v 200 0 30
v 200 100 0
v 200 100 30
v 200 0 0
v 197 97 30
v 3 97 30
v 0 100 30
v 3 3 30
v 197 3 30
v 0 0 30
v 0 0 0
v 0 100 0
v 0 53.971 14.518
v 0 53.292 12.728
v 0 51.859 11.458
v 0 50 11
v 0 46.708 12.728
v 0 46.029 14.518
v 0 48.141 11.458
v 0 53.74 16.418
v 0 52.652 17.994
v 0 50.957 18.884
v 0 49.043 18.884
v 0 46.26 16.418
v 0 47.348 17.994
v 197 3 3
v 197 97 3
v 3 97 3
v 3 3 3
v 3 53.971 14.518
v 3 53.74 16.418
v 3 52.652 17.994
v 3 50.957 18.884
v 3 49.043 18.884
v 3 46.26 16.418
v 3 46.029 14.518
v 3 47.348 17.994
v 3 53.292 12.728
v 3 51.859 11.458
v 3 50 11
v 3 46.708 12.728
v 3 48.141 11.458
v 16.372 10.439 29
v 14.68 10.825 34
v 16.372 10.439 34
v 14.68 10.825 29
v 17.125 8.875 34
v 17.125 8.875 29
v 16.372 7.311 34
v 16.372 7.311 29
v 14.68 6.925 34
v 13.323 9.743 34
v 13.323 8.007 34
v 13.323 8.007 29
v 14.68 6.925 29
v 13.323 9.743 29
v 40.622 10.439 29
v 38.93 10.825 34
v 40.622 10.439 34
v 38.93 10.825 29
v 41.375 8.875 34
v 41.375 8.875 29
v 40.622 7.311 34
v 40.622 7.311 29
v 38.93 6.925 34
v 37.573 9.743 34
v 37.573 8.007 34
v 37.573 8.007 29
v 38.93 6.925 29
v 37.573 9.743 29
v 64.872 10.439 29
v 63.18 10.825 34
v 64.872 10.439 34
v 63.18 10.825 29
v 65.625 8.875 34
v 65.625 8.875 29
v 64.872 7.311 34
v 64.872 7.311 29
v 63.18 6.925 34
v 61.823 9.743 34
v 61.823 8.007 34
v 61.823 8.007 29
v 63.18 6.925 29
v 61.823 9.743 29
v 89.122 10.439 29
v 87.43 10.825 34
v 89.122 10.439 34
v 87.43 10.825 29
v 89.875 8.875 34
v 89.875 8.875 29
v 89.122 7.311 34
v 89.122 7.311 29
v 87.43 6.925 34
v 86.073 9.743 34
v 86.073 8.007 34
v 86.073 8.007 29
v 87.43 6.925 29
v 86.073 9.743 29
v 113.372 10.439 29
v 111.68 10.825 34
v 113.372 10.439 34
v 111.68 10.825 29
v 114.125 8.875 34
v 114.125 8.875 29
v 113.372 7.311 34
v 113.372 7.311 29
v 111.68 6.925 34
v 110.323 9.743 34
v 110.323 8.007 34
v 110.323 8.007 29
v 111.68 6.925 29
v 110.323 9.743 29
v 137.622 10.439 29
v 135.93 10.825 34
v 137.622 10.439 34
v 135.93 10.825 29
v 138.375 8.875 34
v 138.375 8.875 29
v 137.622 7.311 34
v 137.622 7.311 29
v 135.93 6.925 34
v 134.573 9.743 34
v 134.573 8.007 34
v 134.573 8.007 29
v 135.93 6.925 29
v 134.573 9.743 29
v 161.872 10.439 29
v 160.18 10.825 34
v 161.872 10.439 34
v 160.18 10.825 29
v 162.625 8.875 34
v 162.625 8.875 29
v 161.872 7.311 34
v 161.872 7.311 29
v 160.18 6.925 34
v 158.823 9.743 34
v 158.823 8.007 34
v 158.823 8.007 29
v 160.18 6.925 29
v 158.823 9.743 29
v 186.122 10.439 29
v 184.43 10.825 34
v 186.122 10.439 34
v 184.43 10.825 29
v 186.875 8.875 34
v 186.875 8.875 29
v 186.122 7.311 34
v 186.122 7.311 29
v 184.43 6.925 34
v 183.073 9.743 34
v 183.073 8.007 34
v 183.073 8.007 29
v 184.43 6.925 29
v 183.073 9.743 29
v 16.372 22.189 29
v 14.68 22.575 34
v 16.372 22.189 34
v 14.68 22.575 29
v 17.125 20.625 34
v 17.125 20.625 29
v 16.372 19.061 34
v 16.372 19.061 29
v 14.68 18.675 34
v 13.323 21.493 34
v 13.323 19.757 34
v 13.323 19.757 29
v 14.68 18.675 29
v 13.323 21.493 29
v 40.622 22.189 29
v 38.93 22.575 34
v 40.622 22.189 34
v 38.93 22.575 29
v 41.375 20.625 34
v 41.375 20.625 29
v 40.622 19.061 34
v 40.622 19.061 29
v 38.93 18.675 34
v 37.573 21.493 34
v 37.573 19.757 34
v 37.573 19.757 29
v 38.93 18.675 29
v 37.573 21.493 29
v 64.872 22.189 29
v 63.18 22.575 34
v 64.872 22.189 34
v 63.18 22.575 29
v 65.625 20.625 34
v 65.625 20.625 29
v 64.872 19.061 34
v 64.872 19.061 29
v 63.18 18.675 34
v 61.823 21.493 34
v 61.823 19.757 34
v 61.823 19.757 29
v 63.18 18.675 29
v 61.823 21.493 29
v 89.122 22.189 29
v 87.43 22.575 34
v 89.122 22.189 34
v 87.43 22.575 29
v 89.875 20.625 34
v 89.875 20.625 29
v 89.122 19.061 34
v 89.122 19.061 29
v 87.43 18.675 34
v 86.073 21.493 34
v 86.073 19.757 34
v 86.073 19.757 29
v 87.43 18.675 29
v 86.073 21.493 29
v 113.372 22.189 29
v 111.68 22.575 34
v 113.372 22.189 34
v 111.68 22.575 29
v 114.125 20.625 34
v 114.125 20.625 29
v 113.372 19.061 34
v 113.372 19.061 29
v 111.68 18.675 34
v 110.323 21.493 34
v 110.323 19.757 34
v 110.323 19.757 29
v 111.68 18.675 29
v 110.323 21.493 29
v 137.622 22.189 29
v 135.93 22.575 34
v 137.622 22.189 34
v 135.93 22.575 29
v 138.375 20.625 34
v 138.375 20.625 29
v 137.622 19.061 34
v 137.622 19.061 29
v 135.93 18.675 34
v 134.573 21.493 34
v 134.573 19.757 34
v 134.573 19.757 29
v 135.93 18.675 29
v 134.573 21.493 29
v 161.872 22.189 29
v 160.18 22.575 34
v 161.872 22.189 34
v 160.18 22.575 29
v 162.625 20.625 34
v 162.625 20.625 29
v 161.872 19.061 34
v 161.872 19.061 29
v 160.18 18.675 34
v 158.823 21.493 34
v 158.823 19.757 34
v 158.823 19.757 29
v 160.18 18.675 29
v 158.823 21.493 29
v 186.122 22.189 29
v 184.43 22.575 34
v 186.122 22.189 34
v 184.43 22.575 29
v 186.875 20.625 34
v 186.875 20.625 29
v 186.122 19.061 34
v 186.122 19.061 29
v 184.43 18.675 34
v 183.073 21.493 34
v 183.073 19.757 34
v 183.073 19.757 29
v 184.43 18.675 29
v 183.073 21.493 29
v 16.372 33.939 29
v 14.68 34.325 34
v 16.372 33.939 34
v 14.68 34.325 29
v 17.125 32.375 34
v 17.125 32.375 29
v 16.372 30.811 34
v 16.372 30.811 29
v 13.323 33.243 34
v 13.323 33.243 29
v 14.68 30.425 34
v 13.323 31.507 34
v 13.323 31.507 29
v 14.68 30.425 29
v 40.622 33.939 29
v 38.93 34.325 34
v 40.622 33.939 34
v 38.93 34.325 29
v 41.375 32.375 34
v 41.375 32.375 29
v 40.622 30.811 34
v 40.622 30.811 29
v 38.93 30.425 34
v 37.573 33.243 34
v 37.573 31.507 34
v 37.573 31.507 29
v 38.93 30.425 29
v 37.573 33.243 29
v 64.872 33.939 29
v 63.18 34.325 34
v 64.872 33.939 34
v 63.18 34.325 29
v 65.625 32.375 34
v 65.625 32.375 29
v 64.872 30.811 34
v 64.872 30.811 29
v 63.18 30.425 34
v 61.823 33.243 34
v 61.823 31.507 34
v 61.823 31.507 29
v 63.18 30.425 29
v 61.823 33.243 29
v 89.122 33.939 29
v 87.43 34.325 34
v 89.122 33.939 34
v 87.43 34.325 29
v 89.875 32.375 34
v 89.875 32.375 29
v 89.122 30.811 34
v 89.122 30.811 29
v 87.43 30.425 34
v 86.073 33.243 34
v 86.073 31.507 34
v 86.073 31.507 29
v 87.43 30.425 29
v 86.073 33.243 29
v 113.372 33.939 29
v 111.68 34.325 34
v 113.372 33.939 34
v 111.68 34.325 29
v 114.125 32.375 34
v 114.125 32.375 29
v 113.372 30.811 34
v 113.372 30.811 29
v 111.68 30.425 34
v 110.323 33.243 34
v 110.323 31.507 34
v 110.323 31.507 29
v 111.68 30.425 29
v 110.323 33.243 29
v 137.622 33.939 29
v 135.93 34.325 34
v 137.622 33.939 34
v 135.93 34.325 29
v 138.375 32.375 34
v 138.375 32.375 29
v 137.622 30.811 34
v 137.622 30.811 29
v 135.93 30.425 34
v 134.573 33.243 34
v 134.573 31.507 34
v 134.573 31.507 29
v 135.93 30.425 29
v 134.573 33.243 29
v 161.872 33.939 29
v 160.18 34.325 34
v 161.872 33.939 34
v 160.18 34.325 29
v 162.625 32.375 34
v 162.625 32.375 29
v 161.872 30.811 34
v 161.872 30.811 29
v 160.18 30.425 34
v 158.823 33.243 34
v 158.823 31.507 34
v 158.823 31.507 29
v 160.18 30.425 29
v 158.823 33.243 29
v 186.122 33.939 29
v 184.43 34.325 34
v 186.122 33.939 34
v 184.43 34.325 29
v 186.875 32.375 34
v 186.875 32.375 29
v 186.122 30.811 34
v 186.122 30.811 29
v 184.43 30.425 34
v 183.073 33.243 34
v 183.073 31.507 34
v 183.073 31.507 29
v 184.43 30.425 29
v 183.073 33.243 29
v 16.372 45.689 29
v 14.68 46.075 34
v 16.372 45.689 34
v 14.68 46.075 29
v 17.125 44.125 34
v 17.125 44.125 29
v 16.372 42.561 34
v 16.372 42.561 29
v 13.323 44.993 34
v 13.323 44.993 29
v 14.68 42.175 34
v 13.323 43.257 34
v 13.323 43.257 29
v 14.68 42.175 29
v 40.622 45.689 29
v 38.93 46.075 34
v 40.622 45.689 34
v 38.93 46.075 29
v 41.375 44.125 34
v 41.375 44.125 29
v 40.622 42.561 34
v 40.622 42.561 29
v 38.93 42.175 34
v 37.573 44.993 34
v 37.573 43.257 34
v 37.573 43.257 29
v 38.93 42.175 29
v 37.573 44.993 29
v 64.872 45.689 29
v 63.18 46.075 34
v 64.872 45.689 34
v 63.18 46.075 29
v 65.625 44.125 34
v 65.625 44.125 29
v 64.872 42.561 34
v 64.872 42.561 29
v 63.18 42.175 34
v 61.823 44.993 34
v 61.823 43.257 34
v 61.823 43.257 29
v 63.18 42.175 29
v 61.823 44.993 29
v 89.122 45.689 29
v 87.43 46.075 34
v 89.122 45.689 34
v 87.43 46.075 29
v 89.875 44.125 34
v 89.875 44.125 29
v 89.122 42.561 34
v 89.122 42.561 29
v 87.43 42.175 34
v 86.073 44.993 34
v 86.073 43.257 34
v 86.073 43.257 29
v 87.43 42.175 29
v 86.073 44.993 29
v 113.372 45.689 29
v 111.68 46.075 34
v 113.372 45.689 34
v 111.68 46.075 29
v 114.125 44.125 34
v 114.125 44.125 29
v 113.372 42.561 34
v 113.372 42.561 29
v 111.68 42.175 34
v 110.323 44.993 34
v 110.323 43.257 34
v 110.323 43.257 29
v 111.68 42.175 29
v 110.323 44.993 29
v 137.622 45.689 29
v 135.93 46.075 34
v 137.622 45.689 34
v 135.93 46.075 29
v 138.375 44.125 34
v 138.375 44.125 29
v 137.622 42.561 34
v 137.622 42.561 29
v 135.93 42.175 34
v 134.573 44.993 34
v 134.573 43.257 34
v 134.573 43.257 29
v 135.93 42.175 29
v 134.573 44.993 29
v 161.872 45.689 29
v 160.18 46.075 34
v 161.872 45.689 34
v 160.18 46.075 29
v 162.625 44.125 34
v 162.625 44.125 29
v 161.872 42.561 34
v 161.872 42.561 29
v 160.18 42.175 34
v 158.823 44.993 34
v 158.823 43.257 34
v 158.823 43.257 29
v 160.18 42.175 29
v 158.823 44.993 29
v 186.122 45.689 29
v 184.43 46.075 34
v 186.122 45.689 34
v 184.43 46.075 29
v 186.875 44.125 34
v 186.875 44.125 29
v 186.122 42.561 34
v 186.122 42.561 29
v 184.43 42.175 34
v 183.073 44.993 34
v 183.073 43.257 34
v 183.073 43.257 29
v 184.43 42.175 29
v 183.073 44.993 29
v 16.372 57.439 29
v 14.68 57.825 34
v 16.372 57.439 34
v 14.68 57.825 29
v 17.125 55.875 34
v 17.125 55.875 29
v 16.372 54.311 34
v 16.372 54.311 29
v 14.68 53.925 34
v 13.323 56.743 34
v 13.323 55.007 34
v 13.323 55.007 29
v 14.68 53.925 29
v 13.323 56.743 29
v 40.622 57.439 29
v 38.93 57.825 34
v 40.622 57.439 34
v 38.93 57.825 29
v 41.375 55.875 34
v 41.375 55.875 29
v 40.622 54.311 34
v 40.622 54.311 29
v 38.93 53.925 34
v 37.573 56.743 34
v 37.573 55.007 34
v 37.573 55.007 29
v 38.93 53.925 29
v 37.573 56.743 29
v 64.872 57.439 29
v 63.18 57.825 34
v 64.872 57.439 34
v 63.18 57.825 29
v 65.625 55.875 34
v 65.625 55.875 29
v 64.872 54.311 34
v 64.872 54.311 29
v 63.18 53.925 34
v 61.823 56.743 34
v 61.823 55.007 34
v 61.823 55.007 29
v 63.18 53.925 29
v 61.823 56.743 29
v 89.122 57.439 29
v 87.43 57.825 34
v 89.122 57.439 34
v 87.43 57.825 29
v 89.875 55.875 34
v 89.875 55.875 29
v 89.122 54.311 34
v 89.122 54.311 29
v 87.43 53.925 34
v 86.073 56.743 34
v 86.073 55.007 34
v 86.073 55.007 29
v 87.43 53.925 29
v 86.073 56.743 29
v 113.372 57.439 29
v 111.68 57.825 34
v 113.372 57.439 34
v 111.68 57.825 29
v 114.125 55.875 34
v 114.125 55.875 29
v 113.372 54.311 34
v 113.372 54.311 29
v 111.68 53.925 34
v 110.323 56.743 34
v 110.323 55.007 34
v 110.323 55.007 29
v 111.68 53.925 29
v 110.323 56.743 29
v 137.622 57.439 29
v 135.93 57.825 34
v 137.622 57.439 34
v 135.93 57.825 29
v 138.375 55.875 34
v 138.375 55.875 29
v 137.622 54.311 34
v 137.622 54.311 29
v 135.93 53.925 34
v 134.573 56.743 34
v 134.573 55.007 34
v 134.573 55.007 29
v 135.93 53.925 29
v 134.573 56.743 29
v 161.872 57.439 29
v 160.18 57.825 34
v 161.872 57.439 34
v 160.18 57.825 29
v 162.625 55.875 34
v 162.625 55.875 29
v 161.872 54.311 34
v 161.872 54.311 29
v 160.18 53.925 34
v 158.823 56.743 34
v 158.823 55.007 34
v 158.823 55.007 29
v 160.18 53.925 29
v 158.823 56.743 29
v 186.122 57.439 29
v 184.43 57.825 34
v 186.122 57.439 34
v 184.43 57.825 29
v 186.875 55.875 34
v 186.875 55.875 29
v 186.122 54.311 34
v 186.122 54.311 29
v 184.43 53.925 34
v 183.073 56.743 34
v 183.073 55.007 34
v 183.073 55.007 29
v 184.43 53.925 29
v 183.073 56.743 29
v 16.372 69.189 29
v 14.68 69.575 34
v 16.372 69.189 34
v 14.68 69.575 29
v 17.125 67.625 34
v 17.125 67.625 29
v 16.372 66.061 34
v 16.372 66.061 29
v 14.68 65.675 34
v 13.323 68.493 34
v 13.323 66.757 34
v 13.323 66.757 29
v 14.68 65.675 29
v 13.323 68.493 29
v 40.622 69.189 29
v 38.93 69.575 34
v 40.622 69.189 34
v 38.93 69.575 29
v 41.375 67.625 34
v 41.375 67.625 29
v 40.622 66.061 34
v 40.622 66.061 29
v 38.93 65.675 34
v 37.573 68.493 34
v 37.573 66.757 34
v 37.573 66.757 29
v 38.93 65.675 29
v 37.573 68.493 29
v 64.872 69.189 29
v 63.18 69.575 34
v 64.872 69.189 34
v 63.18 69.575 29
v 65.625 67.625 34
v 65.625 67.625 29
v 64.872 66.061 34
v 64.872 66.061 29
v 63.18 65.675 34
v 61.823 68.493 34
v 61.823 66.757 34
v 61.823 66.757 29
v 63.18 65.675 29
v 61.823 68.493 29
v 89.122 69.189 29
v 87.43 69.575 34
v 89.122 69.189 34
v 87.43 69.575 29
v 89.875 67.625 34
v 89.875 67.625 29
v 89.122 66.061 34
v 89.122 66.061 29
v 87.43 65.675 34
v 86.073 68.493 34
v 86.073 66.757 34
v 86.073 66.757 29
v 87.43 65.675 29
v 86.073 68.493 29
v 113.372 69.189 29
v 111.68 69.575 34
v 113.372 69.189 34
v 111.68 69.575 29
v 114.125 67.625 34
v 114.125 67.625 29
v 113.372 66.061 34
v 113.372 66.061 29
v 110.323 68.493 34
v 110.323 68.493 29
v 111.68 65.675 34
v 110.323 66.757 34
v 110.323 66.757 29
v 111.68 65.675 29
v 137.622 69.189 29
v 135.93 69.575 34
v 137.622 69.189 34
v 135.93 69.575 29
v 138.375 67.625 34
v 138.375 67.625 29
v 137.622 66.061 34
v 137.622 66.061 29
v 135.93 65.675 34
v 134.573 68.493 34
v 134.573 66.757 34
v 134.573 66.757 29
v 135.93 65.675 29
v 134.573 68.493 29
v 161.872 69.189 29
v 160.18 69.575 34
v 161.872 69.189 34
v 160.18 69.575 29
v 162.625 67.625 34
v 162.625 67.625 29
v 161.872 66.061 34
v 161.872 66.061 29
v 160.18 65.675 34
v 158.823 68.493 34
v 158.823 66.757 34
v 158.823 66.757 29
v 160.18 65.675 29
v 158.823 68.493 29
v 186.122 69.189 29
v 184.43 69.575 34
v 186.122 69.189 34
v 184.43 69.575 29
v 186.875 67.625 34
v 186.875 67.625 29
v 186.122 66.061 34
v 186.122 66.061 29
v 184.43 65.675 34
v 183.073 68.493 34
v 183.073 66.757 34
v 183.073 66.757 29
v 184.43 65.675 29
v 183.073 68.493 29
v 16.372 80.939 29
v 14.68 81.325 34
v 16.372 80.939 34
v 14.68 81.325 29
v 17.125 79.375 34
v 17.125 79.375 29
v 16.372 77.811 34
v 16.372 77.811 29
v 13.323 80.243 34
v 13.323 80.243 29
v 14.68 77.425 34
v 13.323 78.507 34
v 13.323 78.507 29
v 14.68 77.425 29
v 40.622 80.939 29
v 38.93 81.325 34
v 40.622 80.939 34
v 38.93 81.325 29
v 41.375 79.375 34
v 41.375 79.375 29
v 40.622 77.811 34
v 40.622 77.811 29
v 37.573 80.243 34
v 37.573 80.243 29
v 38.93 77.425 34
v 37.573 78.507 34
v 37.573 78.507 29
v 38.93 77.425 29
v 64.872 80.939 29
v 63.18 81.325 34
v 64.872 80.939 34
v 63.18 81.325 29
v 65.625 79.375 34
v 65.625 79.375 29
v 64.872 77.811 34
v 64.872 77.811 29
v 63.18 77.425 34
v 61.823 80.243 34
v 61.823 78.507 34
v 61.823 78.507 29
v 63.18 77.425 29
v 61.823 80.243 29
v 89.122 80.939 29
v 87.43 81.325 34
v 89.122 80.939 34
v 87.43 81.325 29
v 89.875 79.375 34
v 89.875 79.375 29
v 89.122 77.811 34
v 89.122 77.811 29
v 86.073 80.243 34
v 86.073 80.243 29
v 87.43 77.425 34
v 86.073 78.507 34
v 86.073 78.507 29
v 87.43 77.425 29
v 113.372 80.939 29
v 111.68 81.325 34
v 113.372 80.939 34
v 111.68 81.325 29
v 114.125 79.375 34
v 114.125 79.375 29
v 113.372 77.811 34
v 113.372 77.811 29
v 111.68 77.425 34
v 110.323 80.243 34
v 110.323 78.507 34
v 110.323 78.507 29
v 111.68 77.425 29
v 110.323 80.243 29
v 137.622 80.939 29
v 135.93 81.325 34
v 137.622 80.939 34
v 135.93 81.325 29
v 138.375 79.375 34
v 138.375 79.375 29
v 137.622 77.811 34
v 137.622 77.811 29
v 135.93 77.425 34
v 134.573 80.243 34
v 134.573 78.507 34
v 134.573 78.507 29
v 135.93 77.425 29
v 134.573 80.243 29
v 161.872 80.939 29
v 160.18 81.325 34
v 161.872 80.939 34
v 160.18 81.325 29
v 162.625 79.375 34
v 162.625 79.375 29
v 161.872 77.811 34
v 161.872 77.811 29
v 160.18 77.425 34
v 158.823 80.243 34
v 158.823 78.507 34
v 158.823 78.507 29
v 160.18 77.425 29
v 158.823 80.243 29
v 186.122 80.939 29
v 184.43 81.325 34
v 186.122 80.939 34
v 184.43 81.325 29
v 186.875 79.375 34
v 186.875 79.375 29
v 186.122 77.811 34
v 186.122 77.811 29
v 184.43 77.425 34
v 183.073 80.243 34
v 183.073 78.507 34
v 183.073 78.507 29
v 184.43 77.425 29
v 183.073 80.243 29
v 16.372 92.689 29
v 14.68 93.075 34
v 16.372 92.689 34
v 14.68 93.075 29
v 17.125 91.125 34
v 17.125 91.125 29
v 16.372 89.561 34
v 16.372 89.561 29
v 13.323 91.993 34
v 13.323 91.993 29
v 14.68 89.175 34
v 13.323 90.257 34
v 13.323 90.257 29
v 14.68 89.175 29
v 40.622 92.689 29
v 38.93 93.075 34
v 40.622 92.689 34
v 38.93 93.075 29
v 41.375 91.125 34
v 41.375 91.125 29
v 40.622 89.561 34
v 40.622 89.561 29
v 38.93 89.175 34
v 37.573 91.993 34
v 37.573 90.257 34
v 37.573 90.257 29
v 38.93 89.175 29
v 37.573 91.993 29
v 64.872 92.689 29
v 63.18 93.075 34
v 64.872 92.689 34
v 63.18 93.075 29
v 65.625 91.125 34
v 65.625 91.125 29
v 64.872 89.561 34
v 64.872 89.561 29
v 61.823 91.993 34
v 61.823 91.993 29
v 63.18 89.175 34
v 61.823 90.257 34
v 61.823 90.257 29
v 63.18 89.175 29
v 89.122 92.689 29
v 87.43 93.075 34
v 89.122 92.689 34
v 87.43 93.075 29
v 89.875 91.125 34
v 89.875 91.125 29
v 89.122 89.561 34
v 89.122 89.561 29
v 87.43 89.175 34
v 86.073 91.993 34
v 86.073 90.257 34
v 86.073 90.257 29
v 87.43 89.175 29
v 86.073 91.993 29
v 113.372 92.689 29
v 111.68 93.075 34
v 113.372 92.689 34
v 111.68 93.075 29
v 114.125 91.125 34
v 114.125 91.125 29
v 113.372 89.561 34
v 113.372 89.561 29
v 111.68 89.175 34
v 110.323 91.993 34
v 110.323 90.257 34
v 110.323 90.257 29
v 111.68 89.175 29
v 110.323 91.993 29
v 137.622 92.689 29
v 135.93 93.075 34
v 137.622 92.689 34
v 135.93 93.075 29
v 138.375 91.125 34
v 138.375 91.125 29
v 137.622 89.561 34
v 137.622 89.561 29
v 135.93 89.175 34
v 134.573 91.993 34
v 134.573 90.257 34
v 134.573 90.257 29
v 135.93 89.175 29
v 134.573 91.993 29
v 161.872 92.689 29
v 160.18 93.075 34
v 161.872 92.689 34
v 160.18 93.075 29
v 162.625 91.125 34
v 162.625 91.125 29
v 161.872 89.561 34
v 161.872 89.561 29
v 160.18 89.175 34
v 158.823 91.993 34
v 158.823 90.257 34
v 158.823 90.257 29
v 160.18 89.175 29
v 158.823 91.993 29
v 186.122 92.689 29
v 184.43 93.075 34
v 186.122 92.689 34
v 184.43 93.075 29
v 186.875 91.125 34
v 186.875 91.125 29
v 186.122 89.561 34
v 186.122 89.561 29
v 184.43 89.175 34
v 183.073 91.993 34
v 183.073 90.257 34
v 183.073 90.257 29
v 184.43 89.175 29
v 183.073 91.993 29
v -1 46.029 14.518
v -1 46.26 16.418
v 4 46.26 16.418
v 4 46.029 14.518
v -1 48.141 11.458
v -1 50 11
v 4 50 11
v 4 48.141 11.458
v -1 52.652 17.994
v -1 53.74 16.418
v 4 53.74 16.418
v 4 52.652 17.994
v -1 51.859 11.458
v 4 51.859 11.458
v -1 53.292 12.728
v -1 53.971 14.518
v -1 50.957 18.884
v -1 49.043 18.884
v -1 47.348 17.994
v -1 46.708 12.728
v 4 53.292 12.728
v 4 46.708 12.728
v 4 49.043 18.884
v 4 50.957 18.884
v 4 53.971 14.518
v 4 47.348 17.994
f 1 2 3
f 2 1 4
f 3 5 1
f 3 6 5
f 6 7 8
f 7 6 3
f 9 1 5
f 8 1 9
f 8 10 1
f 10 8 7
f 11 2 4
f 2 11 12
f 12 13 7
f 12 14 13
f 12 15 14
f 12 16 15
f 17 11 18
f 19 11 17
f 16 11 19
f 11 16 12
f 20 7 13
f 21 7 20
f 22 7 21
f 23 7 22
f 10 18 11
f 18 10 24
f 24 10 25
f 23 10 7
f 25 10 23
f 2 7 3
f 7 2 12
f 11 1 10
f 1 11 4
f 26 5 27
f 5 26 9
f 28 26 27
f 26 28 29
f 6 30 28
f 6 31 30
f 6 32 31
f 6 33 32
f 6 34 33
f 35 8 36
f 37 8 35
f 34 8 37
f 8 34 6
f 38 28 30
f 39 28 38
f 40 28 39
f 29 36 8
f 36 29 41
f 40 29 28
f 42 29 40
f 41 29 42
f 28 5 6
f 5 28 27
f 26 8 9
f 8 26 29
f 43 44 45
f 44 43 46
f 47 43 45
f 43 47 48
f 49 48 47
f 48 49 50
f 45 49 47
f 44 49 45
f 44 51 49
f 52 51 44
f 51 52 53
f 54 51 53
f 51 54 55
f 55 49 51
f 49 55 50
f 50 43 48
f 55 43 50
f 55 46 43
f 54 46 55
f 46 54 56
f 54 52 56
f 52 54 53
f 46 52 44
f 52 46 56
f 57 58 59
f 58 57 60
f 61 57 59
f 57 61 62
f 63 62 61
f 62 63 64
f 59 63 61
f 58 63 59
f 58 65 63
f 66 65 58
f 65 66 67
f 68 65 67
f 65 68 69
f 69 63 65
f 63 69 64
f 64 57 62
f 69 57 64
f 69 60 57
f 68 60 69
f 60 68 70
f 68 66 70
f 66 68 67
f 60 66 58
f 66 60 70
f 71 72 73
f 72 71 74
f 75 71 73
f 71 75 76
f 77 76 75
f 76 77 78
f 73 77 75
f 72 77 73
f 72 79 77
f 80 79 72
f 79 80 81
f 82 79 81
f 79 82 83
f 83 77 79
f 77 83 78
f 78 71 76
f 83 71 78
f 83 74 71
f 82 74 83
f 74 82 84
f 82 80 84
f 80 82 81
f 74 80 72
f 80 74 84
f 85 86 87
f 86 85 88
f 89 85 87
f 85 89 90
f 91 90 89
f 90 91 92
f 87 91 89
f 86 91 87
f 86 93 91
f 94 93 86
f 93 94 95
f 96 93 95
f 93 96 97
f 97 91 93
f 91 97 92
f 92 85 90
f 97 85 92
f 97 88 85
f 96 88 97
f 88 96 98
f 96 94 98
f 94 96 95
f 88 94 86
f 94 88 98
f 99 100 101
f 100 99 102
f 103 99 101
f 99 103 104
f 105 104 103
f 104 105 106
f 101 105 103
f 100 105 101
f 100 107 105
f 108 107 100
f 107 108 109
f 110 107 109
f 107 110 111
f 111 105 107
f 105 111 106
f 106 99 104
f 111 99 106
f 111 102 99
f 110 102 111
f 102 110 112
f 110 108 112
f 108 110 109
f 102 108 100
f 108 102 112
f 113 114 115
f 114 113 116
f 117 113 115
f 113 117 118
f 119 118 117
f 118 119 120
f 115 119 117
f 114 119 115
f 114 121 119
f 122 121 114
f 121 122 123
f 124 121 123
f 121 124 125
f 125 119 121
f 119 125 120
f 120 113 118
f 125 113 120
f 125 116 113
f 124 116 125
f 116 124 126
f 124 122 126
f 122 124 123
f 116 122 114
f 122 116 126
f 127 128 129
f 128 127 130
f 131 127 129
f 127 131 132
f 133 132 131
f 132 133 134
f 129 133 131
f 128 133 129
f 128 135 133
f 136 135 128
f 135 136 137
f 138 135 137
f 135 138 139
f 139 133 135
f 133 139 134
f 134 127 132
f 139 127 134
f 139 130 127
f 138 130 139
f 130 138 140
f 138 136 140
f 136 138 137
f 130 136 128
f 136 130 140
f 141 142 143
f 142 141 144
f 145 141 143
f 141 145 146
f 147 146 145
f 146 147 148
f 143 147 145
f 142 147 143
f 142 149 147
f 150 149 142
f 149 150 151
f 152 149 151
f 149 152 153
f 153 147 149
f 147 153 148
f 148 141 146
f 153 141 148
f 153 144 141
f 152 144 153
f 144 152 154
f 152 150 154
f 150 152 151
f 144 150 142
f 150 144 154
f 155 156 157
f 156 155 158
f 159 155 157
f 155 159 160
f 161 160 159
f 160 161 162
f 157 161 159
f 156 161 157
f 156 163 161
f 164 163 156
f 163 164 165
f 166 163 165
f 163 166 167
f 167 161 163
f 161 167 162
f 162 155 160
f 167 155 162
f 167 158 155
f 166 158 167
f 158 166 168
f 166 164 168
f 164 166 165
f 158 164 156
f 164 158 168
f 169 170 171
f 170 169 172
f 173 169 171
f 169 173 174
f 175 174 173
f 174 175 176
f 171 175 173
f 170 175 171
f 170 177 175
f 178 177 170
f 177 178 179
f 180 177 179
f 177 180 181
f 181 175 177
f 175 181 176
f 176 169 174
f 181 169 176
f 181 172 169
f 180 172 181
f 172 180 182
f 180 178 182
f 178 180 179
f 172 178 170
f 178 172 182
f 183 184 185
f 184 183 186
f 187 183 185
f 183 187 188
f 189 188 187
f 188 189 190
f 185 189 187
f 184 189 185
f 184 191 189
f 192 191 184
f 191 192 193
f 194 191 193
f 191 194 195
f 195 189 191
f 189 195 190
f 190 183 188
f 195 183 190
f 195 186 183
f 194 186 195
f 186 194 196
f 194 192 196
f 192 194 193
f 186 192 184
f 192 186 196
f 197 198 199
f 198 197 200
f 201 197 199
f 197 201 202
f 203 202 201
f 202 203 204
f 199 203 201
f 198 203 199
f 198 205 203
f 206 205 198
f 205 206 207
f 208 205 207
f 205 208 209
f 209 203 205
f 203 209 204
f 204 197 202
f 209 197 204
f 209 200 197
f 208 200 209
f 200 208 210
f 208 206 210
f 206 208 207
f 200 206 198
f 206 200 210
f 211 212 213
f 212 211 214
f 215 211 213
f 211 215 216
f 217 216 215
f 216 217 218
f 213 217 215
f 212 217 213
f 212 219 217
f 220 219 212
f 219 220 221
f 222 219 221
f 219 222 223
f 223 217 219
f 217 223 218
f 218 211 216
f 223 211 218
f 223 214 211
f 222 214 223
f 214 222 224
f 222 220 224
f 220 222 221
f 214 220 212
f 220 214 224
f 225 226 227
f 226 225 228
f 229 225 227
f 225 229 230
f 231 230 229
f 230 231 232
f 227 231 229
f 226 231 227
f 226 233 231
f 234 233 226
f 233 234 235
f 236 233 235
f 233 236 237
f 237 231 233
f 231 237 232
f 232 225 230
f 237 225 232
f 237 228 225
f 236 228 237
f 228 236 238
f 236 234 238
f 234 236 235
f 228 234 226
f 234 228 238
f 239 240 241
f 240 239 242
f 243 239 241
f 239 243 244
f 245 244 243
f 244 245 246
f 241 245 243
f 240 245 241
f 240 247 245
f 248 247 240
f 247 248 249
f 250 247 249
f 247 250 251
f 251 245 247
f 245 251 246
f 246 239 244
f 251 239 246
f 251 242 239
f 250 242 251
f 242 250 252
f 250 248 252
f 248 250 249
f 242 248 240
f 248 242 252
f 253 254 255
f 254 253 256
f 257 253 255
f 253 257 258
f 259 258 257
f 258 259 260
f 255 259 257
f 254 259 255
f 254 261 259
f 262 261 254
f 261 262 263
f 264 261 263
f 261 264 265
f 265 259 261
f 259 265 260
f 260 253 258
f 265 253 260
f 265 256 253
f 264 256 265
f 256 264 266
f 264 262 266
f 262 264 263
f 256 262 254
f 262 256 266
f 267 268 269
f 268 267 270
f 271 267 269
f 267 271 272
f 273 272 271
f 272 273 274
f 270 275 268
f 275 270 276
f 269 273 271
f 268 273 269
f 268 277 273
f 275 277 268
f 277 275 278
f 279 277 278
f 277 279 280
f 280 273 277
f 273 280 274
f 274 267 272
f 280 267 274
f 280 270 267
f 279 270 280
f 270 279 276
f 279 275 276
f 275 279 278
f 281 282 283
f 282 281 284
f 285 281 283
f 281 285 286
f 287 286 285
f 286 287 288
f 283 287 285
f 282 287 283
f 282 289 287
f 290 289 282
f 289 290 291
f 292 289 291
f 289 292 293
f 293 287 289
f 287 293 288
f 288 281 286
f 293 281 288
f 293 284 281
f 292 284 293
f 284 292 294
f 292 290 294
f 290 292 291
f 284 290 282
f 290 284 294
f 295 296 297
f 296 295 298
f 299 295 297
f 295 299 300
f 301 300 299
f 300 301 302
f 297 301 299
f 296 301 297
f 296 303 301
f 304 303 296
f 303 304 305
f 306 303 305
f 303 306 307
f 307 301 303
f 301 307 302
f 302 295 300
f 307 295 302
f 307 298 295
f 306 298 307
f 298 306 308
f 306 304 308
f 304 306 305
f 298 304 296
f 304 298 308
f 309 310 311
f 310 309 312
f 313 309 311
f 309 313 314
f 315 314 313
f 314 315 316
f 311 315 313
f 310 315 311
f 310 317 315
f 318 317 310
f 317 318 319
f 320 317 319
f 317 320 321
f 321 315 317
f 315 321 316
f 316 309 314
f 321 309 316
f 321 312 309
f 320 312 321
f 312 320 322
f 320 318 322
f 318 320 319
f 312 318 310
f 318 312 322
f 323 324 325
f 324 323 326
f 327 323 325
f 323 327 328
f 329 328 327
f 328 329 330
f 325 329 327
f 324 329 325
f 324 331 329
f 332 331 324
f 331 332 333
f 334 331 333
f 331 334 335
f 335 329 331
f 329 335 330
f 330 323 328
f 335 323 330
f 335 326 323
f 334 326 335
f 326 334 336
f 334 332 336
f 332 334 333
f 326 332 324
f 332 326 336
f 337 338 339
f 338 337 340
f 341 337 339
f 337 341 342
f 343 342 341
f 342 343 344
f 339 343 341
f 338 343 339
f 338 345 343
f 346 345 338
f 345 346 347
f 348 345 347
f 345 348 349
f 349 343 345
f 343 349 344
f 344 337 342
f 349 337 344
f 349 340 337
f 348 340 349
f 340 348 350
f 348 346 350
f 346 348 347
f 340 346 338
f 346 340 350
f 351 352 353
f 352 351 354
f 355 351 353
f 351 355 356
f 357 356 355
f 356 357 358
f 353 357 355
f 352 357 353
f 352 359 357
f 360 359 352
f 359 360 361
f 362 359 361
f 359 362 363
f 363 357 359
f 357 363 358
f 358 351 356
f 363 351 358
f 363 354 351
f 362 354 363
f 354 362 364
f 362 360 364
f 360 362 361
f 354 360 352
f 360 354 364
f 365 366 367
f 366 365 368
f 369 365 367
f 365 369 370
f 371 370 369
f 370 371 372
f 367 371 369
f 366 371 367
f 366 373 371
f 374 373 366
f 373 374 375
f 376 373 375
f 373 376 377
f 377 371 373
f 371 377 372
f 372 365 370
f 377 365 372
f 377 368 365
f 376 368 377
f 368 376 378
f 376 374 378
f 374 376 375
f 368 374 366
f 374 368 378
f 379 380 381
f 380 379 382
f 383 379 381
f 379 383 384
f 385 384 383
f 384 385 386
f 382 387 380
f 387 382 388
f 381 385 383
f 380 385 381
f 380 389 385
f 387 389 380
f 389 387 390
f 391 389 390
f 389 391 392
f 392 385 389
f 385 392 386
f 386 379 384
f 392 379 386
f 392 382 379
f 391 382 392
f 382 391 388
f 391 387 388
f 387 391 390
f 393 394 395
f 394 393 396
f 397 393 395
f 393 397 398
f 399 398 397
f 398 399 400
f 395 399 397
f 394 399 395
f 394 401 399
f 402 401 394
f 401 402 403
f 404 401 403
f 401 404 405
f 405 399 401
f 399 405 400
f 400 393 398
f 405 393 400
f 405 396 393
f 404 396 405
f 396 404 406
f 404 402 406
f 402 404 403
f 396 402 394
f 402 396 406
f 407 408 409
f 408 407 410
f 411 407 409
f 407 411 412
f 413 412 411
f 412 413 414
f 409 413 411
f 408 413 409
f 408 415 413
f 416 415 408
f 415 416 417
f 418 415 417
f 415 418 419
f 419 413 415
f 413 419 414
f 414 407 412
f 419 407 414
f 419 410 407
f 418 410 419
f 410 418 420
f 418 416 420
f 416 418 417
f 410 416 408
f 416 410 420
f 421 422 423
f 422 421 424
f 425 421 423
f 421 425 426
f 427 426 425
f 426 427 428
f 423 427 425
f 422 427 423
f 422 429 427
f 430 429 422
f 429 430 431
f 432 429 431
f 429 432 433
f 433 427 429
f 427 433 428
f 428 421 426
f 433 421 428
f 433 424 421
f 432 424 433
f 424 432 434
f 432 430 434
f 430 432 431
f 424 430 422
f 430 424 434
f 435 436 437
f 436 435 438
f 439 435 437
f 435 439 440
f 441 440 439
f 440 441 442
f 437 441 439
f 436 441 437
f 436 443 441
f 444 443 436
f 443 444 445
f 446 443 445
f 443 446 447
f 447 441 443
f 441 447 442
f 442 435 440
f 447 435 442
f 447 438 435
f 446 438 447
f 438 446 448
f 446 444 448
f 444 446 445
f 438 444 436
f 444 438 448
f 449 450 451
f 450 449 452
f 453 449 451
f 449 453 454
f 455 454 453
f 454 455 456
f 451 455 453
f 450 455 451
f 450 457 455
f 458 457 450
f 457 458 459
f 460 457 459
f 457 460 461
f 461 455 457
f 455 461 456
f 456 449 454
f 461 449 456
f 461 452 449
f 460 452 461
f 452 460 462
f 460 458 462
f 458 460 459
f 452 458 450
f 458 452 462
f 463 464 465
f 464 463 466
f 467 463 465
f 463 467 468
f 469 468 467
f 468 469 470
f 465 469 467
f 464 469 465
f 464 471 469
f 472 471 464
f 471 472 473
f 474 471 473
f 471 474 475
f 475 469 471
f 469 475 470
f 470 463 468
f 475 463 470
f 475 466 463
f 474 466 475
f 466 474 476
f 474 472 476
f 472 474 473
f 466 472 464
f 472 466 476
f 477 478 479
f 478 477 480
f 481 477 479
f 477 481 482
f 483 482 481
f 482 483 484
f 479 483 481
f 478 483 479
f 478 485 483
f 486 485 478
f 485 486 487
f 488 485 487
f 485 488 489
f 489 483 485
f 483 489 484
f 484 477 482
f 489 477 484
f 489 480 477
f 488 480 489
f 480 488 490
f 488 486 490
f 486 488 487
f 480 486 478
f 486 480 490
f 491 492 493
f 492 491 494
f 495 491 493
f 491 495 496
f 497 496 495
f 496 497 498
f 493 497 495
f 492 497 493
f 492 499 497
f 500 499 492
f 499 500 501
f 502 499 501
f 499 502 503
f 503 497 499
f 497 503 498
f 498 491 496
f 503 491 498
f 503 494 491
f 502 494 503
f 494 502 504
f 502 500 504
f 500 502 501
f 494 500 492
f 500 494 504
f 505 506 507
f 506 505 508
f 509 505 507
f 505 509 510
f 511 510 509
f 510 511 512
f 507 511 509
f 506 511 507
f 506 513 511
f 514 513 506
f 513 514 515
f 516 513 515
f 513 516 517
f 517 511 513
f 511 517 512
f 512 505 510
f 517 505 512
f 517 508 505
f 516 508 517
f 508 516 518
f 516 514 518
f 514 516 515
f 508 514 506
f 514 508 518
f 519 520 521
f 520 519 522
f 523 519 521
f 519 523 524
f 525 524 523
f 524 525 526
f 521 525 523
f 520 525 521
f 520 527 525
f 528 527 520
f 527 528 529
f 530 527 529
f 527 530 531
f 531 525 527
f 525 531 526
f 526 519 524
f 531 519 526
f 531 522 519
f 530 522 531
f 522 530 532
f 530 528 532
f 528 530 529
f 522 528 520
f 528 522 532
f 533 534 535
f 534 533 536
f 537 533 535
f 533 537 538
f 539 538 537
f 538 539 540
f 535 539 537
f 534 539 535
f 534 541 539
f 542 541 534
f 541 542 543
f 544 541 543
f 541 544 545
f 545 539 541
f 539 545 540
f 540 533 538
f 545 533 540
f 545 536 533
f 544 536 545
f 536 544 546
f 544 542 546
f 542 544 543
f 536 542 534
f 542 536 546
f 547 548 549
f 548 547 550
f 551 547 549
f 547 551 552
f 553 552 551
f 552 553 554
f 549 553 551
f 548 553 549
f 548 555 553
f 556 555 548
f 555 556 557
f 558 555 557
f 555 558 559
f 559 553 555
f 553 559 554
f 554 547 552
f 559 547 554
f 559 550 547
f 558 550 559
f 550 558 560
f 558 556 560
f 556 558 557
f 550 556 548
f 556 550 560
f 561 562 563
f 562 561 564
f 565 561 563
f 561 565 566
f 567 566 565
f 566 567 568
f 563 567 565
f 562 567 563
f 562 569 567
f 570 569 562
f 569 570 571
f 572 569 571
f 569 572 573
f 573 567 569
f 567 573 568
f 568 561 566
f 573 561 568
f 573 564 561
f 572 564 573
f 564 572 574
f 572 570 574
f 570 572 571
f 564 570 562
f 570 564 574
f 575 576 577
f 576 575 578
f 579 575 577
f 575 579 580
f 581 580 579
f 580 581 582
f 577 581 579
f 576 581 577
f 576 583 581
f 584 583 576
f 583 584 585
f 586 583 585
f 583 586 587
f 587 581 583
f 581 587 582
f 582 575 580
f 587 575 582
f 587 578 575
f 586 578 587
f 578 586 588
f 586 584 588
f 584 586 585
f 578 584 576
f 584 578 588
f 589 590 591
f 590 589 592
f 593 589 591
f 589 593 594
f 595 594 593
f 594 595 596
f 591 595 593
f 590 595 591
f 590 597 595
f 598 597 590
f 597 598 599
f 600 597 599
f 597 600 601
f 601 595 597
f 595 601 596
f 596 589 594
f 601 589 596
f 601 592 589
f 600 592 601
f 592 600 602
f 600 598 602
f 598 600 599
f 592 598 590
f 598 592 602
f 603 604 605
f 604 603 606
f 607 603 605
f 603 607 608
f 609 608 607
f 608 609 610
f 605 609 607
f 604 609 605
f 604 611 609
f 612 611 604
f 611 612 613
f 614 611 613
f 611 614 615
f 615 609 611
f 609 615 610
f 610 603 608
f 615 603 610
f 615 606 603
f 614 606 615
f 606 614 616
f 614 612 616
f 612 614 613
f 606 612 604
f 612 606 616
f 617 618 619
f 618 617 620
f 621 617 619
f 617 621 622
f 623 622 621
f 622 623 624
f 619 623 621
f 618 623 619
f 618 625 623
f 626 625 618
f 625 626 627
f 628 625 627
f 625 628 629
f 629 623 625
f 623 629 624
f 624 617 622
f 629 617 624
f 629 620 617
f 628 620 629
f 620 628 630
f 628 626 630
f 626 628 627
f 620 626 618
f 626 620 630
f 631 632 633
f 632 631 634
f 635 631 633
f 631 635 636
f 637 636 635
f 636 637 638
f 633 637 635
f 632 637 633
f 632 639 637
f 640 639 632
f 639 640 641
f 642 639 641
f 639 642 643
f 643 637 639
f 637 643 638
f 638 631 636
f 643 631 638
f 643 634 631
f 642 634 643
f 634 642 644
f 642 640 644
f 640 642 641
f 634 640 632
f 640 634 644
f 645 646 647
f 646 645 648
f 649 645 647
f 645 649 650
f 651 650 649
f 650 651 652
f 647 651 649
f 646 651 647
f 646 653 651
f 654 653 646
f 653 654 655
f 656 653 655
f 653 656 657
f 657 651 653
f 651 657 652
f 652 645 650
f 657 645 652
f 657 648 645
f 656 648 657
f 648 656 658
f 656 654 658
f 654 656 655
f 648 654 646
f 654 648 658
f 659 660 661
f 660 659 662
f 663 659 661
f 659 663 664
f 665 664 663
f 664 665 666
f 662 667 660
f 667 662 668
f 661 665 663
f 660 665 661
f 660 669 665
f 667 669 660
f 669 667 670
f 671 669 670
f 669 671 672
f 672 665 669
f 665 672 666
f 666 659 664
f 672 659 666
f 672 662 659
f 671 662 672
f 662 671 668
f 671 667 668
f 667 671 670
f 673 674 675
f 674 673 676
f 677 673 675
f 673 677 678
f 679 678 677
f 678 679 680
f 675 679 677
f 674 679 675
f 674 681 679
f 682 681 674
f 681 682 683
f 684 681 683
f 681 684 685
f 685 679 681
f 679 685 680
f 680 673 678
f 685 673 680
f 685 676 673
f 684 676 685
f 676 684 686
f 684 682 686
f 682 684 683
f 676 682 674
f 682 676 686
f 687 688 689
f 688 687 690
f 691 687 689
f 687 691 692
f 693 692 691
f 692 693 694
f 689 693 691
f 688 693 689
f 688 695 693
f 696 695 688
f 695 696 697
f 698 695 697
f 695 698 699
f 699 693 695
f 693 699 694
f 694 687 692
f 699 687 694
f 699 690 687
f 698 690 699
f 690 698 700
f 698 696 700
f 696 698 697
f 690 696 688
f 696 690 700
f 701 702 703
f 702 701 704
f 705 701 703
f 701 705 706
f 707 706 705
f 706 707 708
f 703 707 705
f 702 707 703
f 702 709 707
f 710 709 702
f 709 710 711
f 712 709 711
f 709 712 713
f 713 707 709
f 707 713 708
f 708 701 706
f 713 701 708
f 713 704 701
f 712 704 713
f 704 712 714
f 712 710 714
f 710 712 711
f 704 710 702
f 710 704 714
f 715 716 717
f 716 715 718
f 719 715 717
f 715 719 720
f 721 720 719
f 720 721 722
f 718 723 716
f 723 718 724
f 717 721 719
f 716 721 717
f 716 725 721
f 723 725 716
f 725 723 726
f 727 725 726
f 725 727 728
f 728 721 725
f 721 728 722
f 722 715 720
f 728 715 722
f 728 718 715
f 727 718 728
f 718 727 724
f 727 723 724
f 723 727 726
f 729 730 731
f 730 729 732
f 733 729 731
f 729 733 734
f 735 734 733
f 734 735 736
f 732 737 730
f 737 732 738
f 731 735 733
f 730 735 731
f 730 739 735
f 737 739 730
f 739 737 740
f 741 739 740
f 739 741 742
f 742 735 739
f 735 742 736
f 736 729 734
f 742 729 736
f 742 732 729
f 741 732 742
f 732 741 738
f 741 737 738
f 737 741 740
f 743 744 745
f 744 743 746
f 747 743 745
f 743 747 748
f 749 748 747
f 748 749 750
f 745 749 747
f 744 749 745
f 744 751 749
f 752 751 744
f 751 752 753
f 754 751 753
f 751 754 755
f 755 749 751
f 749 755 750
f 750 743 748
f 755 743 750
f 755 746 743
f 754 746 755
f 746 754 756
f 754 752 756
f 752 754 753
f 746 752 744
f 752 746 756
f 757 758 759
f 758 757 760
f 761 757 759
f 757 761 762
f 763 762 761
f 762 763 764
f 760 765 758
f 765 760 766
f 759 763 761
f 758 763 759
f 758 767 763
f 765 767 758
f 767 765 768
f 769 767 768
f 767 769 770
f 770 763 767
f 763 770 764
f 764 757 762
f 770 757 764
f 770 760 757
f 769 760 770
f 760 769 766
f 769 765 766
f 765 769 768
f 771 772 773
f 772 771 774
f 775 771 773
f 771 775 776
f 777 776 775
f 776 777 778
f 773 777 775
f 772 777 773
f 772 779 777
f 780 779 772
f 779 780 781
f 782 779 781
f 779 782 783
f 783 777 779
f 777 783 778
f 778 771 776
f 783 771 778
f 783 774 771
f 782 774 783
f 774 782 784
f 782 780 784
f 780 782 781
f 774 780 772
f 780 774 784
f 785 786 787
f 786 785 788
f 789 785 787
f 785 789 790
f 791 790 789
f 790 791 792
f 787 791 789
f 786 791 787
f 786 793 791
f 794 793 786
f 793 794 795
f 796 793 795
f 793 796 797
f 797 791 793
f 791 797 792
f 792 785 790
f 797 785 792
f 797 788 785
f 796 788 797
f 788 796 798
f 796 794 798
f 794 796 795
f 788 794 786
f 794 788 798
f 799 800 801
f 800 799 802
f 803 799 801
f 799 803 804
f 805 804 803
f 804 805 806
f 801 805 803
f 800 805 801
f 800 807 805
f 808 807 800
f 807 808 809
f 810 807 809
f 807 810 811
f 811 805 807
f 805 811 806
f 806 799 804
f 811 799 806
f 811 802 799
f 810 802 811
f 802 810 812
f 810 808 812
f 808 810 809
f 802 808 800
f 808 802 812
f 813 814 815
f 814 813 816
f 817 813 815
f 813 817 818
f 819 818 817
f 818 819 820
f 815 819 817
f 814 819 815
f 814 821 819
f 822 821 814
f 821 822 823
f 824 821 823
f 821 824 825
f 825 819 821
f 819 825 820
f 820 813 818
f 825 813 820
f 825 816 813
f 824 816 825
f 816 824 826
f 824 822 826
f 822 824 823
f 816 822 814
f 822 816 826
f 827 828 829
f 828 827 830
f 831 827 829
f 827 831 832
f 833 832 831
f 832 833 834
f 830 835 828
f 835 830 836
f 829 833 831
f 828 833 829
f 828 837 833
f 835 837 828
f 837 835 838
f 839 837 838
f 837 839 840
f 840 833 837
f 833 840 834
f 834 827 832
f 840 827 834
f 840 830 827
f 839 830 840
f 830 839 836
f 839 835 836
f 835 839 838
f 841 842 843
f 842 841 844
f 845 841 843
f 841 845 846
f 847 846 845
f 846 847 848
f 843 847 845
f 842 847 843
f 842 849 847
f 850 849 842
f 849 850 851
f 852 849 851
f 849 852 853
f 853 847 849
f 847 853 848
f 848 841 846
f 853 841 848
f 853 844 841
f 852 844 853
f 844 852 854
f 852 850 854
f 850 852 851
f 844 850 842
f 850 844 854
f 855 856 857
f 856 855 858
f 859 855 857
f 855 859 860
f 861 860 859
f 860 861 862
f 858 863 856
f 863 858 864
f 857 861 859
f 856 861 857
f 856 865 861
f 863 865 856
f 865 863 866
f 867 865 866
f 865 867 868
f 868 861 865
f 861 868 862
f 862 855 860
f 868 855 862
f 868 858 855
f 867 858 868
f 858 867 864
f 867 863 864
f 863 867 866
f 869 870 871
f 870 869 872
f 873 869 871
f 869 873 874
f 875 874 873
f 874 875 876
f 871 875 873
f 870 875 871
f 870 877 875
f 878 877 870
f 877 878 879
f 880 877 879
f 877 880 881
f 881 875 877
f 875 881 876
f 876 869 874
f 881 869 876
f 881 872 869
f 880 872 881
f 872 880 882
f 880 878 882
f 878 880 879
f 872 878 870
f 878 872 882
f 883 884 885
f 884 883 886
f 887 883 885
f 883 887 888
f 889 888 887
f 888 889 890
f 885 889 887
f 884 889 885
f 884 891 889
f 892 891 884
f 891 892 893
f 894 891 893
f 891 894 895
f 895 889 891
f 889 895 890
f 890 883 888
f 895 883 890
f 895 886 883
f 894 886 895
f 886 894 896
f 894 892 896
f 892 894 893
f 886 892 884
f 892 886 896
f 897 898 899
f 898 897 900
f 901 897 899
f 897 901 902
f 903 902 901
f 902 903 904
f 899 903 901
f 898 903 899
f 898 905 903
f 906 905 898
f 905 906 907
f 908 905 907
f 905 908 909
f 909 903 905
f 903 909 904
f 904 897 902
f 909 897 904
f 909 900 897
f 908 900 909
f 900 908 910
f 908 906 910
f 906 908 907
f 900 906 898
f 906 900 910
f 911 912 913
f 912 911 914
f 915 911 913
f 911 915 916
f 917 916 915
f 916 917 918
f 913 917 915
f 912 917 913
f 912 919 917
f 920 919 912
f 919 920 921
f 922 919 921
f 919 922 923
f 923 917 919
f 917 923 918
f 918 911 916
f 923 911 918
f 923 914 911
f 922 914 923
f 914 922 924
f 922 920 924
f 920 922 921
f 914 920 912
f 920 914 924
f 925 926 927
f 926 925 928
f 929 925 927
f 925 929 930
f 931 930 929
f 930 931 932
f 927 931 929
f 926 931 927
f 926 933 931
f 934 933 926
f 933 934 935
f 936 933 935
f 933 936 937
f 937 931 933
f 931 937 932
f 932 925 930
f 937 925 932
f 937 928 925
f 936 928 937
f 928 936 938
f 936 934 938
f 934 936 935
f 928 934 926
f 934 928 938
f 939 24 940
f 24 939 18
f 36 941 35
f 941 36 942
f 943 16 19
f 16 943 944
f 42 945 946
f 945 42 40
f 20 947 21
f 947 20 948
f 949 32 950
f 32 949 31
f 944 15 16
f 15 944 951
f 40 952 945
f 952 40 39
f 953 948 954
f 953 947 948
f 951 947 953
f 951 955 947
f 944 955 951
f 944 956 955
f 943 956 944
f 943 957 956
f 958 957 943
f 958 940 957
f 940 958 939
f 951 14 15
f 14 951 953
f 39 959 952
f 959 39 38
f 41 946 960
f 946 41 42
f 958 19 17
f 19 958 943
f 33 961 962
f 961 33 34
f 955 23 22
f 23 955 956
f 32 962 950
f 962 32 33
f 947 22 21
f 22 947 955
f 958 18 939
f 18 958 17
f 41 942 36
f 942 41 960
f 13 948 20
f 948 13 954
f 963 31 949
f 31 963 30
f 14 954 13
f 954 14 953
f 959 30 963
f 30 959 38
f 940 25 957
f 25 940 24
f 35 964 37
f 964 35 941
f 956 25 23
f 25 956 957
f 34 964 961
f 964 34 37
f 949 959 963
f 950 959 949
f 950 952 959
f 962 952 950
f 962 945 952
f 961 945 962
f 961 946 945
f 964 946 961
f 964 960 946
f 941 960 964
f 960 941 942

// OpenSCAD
// ====================================================================
// Pneumatic Manifold (1 inlet -> 64 outlets)
// ====================================================================

/* [Manifold] */
body_width = 200;
body_depth = 100;
body_height = 30;
wall = 3;
inlet_d = 8;
outlet_d = 4;
n_cols = 8;
n_rows = 8;

module manifold_body() {
    difference() {
        cube([body_width, body_depth, body_height]);
        translate([wall, wall, wall])
            cube([body_width - 2*wall, body_depth - 2*wall, body_height - wall]);
    }
}

module manifold_inlet() {
    translate([-1, body_depth/2, body_height/2])
        rotate([0, 90, 0])
            cylinder(d=inlet_d, h=wall + 2);
}

module manifold_outlets() {
    outlet_w = (body_width - 2*wall) / n_cols;
    outlet_h = (body_depth - 2*wall) / n_rows;
    for (r = [0, 1, 2, 3, 4, 5, 6, 7])
    for (c = [0, 1, 2, 3, 4, 5, 6, 7])
        translate([wall + (c + 0.5) * outlet_w,
                   wall + (r + 0.5) * outlet_h,
                   body_height - 1])
            cylinder(d=outlet_d, h=5);
}

// ====================================================================
// TOP-LEVEL RENDER (inlet=blue, outlets=red for clarity)
// ====================================================================
color("#9E9E9E") manifold_body();
color("#1976D2") manifold_inlet();
color("#D32F2F") manifold_outlets();
